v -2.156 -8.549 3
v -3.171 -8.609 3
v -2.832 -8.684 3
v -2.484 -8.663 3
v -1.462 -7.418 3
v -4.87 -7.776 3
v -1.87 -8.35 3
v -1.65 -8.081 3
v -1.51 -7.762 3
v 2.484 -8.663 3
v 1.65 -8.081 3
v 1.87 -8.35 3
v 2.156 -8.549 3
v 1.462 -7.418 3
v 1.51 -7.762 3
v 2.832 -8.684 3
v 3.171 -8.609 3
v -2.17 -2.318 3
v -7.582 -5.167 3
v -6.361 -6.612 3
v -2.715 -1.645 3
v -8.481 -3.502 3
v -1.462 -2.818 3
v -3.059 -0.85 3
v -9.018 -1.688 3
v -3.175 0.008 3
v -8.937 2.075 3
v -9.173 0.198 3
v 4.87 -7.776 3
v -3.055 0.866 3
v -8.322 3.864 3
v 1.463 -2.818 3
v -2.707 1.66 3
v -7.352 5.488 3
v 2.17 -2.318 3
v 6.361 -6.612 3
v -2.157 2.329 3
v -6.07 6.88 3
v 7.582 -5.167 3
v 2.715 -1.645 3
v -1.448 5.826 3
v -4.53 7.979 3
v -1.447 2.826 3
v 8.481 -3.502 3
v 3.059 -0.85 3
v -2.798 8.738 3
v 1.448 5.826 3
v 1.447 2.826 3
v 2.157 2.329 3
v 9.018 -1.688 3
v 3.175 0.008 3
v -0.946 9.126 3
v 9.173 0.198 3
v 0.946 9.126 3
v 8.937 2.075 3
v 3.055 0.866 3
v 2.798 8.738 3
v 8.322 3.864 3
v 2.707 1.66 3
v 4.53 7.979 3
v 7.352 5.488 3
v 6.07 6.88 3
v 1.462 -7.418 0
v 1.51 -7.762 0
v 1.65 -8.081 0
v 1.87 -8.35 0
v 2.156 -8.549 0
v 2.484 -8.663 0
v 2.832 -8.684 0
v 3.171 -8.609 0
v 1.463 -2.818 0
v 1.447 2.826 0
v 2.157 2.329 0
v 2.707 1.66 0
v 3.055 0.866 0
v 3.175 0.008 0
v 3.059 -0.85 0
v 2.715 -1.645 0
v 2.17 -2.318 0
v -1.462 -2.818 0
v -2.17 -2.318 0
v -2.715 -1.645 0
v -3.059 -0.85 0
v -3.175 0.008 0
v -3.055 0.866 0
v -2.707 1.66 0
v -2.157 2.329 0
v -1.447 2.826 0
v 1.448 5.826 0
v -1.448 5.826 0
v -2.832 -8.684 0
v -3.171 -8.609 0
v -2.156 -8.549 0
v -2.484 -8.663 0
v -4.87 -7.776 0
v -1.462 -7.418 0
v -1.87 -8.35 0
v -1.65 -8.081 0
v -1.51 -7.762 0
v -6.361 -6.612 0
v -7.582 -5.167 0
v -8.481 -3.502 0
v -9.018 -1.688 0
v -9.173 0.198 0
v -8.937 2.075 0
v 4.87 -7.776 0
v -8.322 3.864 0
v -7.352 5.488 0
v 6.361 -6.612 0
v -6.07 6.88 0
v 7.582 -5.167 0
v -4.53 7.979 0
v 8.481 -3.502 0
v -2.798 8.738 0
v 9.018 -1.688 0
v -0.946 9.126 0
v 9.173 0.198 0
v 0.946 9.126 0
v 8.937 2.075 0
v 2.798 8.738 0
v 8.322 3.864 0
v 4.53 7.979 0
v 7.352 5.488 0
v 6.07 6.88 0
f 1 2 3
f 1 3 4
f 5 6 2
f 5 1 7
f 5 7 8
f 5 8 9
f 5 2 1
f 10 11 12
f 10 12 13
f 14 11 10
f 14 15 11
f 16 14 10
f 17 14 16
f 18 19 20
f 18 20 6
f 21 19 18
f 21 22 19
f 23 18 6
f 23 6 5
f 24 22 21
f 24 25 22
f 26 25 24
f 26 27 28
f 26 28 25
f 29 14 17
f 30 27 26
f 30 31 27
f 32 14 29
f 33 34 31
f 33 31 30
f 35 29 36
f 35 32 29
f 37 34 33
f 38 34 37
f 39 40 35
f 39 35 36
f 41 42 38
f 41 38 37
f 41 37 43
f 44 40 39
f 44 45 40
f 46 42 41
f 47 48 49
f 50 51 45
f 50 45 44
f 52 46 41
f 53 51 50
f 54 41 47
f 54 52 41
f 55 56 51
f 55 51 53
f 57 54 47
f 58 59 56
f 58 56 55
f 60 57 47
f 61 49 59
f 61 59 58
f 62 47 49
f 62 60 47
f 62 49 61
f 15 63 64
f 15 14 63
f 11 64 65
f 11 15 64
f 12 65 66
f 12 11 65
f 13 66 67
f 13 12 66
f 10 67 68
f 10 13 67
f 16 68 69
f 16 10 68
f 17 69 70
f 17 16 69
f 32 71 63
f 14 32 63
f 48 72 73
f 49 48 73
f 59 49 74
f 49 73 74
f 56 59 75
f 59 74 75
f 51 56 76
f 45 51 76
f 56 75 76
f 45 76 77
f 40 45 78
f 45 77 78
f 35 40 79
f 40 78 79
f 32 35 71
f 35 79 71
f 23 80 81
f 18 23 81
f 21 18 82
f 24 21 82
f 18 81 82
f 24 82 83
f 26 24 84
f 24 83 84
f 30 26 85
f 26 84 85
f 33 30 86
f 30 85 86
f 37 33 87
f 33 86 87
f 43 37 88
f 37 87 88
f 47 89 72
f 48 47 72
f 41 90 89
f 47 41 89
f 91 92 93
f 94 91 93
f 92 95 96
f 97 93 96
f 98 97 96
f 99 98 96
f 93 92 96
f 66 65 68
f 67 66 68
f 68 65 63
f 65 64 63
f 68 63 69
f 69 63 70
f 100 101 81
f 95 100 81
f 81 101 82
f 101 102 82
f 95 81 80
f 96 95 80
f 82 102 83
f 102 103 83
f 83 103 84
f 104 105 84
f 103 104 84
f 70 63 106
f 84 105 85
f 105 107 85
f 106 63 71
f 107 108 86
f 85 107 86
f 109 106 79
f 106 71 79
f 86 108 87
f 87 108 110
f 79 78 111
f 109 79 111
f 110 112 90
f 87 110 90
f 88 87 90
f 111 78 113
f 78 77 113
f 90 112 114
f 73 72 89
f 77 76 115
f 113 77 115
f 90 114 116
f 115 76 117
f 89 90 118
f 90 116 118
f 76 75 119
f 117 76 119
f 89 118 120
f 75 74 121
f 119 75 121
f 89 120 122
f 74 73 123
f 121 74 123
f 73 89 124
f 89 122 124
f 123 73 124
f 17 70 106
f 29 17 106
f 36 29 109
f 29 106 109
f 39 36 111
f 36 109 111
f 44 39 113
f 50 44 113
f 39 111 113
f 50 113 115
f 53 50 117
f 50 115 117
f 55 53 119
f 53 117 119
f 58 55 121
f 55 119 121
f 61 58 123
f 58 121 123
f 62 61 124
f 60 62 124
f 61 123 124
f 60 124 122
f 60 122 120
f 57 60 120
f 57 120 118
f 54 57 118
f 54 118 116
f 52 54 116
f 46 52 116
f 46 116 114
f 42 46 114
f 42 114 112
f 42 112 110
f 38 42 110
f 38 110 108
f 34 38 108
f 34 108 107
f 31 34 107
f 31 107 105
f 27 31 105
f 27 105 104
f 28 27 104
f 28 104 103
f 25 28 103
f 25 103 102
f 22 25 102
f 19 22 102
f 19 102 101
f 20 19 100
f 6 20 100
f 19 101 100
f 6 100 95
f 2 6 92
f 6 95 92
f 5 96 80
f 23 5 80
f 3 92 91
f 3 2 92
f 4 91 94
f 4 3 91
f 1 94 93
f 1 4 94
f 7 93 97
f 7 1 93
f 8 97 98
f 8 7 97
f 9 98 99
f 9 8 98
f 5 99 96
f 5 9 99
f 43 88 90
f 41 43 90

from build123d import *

# Parameters (mm, degrees)
EXTRUDE_1_DEPTH = 3
FILLET_1_R      = 1.27


with BuildPart() as part:
    # 스케치1 → 보스-돌출1 (new body)
    with BuildSketch(Plane.XY):
        with BuildLine():
            Line((-1.4475, 5.825839477), (1.4475, 5.825839477))
            Line((1.4475, 5.825839477), (1.4475, 2.825839477))
            ThreePointArc((1.4475, 2.825839477), (3.174988787, 0.008438217), (1.4625, -2.818105525))
            Line((1.4625, -2.818105525), (1.4625, -9.057688378))
            ThreePointArc((1.4625, -9.057688378), (0, 9.175), (-1.4625, -9.057688378))
            Line((-1.4625, -9.057688378), (-1.4625, -2.818105525))
            ThreePointArc((-1.4625, -2.818105525), (-3.174988787, 0.008438217), (-1.4475, 2.825839477))
            Line((-1.4475, 2.825839477), (-1.4475, 5.825839477))
        make_face()
    extrude(amount=EXTRUDE_1_DEPTH)

    # 필렛1
    fillet_1_edges = [part.edges().sort_by_distance(p)[0] for p in [
        (-1.4625, -9.057688378, 1.5),
        (1.4625, -9.057688378, 1.5),
    ]]
    fillet(fillet_1_edges, radius=FILLET_1_R)


solid = part.part
